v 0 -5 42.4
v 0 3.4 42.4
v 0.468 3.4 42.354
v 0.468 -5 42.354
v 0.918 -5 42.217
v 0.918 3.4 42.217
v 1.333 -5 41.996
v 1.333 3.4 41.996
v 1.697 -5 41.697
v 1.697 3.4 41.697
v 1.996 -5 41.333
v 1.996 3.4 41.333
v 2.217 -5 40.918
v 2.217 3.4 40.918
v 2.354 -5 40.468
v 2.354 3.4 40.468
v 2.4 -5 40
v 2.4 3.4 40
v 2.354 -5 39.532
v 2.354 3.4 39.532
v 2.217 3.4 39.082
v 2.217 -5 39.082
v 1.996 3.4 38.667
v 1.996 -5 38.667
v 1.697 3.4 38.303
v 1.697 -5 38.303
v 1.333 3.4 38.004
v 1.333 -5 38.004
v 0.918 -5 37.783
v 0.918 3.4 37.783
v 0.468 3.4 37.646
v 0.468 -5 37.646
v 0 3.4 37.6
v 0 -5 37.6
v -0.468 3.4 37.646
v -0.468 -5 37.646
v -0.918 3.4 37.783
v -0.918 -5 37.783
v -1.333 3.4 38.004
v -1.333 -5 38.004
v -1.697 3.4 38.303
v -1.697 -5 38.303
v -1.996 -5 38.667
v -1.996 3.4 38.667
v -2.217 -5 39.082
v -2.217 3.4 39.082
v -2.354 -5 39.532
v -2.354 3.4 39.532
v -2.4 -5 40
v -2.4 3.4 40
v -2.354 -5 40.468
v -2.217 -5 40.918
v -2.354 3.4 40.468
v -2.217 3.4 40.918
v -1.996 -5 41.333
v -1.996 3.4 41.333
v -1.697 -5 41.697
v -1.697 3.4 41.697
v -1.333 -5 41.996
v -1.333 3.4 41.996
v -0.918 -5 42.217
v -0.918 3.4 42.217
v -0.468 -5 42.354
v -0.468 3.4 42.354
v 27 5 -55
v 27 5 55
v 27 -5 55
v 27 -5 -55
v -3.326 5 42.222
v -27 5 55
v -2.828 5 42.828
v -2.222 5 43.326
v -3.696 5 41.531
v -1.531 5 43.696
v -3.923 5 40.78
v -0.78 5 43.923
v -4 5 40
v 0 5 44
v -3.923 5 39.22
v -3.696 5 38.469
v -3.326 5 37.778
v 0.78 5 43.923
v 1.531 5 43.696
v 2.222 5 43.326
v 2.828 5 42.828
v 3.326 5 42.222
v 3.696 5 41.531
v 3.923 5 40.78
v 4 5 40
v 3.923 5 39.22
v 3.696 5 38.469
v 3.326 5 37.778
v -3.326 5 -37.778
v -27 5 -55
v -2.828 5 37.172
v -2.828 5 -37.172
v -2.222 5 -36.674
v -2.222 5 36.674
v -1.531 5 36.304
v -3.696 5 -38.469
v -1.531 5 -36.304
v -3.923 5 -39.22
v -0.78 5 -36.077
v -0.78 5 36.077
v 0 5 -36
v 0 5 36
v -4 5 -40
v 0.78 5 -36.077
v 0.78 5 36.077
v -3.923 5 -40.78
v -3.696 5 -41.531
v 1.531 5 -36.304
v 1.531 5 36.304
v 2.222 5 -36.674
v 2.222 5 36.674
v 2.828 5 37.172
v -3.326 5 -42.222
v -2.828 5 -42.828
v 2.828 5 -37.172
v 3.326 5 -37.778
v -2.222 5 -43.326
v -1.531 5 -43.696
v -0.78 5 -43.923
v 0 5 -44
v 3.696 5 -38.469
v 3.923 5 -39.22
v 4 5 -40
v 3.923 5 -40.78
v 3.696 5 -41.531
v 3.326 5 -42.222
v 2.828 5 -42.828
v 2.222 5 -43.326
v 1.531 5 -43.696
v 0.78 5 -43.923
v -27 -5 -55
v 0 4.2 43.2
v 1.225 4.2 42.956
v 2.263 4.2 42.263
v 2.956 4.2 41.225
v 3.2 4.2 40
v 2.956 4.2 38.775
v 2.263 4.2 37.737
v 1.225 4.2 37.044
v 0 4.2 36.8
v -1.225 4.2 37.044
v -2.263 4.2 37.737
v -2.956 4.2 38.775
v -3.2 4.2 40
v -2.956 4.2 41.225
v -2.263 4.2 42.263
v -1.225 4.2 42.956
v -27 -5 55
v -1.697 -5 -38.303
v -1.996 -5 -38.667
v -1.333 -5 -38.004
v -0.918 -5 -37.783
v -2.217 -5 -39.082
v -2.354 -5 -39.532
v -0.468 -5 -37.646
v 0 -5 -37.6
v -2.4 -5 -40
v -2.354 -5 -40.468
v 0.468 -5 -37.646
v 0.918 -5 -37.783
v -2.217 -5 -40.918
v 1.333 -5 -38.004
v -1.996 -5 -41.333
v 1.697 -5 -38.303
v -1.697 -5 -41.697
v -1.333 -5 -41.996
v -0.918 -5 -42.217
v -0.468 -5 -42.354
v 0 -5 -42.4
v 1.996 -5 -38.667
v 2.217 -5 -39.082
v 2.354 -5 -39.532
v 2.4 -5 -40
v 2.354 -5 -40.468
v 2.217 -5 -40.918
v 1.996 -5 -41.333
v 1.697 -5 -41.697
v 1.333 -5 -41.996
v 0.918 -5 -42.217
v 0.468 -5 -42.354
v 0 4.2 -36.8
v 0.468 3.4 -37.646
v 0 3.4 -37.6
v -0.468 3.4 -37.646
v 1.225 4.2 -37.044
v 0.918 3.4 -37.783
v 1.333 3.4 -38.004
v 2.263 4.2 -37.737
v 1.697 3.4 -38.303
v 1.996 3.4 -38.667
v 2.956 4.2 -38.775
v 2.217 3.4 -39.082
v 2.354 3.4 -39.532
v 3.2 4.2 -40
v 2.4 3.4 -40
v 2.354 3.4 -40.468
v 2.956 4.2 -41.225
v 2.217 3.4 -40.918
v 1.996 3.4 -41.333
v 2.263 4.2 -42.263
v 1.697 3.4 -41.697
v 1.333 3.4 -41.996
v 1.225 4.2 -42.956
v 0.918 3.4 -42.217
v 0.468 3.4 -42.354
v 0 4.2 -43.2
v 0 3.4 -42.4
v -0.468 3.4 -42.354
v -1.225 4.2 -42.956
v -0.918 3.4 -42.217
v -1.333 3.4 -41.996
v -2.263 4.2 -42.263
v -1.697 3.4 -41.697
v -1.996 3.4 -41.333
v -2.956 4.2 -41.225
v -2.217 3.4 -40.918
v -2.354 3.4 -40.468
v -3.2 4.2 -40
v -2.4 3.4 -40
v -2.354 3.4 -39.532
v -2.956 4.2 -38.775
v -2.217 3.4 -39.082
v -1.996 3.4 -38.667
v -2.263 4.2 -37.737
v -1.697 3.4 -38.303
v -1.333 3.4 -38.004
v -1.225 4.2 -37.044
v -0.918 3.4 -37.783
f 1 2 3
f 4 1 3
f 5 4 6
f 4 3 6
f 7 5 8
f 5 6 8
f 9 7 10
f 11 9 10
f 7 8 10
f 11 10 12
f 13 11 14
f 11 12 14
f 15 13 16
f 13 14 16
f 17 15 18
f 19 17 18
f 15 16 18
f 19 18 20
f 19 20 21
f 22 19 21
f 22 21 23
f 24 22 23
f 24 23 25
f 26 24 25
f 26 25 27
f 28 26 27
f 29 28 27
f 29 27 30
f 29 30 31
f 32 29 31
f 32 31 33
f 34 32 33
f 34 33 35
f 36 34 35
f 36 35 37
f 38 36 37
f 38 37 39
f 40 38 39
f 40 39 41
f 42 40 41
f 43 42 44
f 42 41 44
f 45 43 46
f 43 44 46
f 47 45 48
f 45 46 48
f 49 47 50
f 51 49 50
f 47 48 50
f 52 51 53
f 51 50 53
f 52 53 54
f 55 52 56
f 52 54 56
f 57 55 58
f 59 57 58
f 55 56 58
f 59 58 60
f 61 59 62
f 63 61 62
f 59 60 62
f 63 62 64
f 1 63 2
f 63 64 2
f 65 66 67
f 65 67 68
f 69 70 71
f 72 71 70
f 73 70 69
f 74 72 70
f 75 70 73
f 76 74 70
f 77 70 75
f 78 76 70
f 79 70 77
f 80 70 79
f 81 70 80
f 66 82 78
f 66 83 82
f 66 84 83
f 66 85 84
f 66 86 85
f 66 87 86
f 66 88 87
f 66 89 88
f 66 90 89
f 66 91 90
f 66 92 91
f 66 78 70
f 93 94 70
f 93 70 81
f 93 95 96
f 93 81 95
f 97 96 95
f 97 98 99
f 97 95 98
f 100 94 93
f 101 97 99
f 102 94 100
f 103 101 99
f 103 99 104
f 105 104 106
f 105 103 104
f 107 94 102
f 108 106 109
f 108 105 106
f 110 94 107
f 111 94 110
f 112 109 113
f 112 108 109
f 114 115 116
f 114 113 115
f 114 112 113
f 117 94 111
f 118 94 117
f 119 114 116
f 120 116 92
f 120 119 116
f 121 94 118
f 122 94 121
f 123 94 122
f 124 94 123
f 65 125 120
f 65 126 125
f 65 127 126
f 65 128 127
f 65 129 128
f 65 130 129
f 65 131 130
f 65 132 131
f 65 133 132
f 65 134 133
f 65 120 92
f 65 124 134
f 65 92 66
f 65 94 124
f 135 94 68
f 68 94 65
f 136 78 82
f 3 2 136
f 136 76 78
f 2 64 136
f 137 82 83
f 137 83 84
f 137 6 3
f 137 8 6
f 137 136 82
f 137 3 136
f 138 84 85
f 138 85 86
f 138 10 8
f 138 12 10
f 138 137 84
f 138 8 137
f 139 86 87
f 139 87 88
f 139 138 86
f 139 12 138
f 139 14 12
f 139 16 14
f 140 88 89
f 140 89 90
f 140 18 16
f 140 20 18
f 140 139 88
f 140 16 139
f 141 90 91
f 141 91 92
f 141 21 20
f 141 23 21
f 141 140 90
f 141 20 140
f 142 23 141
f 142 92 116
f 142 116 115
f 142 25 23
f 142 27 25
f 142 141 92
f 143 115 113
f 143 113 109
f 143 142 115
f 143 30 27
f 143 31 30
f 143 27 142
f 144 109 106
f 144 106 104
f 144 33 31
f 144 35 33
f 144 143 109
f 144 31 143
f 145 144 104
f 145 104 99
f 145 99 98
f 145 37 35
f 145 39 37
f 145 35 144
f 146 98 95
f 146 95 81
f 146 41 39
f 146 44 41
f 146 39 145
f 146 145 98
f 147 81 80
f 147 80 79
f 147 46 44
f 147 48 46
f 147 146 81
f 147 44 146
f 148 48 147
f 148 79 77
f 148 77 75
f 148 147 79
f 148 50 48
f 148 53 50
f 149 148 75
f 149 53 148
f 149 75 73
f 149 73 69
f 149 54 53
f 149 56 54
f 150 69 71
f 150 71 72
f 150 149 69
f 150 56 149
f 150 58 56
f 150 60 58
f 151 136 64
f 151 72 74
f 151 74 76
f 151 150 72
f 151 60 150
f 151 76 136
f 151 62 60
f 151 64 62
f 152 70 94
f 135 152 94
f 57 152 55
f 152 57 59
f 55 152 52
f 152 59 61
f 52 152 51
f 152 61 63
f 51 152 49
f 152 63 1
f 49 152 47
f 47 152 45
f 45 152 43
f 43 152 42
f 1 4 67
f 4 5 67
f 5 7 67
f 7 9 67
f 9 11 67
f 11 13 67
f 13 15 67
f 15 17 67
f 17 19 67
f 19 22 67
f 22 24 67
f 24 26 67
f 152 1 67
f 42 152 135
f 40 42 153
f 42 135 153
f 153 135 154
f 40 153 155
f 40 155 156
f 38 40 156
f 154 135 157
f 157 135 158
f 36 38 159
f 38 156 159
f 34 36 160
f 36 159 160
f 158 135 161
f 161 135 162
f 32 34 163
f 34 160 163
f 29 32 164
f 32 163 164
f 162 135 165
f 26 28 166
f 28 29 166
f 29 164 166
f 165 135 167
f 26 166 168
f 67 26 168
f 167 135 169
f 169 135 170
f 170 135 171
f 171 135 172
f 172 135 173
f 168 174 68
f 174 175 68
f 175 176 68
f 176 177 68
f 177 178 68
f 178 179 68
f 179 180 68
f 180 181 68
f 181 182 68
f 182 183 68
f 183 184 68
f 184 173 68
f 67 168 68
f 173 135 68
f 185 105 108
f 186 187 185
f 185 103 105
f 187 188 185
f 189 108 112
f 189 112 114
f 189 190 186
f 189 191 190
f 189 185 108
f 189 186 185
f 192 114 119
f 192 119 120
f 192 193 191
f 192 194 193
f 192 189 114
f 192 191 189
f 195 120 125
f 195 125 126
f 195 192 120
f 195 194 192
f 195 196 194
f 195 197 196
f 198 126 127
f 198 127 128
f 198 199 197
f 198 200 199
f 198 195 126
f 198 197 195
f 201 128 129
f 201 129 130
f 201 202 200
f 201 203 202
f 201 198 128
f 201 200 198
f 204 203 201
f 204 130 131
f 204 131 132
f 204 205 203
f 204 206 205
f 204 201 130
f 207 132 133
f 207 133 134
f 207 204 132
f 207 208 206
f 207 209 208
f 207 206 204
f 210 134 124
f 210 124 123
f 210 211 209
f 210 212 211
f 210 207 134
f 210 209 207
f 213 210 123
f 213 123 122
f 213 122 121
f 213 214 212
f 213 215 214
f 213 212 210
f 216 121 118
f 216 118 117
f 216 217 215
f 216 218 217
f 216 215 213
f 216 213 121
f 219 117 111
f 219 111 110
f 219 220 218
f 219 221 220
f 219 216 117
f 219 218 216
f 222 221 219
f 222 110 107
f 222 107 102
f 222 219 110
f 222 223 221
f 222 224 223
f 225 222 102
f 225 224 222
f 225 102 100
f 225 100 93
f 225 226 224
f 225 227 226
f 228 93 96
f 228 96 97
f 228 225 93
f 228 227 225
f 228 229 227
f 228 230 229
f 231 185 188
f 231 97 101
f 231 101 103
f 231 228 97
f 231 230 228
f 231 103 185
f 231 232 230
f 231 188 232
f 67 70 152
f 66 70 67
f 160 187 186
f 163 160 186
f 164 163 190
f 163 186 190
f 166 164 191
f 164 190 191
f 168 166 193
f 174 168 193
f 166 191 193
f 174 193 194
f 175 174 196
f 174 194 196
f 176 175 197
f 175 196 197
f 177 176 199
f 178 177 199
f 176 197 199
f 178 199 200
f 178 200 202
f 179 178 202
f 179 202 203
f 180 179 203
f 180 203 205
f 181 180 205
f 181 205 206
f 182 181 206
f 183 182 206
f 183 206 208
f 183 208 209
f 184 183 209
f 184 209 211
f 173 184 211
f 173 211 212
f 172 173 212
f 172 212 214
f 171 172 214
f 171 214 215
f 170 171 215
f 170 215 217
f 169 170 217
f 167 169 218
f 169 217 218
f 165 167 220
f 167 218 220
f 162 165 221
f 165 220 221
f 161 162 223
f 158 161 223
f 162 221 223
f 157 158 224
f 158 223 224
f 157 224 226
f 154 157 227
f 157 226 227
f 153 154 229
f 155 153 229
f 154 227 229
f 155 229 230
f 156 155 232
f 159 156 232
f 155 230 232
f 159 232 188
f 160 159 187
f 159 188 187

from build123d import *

# Parameters (mm, degrees)
SKETCH_2_W          = 54
SKETCH_2_H          = 110
EXTRUDE_1_DEPTH     = 5
CUT_EXTRUDE_1_REACH = 64.081
SKETCH_3_R          = 2.4
CHAMFER_1_SIZE      = 1.6


with BuildPart() as part:
    # Эскиз2 → Бобышка-Вытянуть1 (new, symmetric)
    with BuildSketch(Plane(origin=(0, 0, 0), x_dir=(1, 0, 0), z_dir=(0, 1, 0))):
        Rectangle(SKETCH_2_W, SKETCH_2_H)
    extrude(amount=EXTRUDE_1_DEPTH, both=True)

    # Эскиз3 → Вырез-Вытянуть1 (cut, up to next)
    with BuildSketch(Plane(origin=(0, 5, 0), x_dir=(1, 0, 0), z_dir=(0, 1, 0)), mode=Mode.PRIVATE) as cut_extrude_1_sk1:
        with Locations(Location((0, 40, 0), (0, 0, 270))):
            Circle(SKETCH_3_R)
    cut_extrude_1_tool1 = extrude(cut_extrude_1_sk1.sketch, amount=-CUT_EXTRUDE_1_REACH, mode=Mode.PRIVATE) & part.part
    # Эскиз3 → Вырез-Вытянуть1 (cut, up to next)
    with BuildSketch(Plane(origin=(0, 5, 0), x_dir=(1, 0, 0), z_dir=(0, 1, 0)), mode=Mode.PRIVATE) as cut_extrude_1_sk2:
        with Locations(Location((0, -40, 0), (0, 0, 270))):
            Circle(SKETCH_3_R)
    cut_extrude_1_tool2 = extrude(cut_extrude_1_sk2.sketch, amount=-CUT_EXTRUDE_1_REACH, mode=Mode.PRIVATE) & part.part
    add(cut_extrude_1_tool1.solids().sort_by_distance((0, 5, -40))[0], mode=Mode.SUBTRACT)
    add(cut_extrude_1_tool2.solids().sort_by_distance((0, 5, 40))[0], mode=Mode.SUBTRACT)

    # Фаска1
    chamfer_1_edges = [part.edges().sort_by_distance(p)[0] for p in [
        (0, 5, -42.4),
        (0, 5, 37.6),
    ]]
    chamfer(chamfer_1_edges, length=CHAMFER_1_SIZE)


solid = part.part
